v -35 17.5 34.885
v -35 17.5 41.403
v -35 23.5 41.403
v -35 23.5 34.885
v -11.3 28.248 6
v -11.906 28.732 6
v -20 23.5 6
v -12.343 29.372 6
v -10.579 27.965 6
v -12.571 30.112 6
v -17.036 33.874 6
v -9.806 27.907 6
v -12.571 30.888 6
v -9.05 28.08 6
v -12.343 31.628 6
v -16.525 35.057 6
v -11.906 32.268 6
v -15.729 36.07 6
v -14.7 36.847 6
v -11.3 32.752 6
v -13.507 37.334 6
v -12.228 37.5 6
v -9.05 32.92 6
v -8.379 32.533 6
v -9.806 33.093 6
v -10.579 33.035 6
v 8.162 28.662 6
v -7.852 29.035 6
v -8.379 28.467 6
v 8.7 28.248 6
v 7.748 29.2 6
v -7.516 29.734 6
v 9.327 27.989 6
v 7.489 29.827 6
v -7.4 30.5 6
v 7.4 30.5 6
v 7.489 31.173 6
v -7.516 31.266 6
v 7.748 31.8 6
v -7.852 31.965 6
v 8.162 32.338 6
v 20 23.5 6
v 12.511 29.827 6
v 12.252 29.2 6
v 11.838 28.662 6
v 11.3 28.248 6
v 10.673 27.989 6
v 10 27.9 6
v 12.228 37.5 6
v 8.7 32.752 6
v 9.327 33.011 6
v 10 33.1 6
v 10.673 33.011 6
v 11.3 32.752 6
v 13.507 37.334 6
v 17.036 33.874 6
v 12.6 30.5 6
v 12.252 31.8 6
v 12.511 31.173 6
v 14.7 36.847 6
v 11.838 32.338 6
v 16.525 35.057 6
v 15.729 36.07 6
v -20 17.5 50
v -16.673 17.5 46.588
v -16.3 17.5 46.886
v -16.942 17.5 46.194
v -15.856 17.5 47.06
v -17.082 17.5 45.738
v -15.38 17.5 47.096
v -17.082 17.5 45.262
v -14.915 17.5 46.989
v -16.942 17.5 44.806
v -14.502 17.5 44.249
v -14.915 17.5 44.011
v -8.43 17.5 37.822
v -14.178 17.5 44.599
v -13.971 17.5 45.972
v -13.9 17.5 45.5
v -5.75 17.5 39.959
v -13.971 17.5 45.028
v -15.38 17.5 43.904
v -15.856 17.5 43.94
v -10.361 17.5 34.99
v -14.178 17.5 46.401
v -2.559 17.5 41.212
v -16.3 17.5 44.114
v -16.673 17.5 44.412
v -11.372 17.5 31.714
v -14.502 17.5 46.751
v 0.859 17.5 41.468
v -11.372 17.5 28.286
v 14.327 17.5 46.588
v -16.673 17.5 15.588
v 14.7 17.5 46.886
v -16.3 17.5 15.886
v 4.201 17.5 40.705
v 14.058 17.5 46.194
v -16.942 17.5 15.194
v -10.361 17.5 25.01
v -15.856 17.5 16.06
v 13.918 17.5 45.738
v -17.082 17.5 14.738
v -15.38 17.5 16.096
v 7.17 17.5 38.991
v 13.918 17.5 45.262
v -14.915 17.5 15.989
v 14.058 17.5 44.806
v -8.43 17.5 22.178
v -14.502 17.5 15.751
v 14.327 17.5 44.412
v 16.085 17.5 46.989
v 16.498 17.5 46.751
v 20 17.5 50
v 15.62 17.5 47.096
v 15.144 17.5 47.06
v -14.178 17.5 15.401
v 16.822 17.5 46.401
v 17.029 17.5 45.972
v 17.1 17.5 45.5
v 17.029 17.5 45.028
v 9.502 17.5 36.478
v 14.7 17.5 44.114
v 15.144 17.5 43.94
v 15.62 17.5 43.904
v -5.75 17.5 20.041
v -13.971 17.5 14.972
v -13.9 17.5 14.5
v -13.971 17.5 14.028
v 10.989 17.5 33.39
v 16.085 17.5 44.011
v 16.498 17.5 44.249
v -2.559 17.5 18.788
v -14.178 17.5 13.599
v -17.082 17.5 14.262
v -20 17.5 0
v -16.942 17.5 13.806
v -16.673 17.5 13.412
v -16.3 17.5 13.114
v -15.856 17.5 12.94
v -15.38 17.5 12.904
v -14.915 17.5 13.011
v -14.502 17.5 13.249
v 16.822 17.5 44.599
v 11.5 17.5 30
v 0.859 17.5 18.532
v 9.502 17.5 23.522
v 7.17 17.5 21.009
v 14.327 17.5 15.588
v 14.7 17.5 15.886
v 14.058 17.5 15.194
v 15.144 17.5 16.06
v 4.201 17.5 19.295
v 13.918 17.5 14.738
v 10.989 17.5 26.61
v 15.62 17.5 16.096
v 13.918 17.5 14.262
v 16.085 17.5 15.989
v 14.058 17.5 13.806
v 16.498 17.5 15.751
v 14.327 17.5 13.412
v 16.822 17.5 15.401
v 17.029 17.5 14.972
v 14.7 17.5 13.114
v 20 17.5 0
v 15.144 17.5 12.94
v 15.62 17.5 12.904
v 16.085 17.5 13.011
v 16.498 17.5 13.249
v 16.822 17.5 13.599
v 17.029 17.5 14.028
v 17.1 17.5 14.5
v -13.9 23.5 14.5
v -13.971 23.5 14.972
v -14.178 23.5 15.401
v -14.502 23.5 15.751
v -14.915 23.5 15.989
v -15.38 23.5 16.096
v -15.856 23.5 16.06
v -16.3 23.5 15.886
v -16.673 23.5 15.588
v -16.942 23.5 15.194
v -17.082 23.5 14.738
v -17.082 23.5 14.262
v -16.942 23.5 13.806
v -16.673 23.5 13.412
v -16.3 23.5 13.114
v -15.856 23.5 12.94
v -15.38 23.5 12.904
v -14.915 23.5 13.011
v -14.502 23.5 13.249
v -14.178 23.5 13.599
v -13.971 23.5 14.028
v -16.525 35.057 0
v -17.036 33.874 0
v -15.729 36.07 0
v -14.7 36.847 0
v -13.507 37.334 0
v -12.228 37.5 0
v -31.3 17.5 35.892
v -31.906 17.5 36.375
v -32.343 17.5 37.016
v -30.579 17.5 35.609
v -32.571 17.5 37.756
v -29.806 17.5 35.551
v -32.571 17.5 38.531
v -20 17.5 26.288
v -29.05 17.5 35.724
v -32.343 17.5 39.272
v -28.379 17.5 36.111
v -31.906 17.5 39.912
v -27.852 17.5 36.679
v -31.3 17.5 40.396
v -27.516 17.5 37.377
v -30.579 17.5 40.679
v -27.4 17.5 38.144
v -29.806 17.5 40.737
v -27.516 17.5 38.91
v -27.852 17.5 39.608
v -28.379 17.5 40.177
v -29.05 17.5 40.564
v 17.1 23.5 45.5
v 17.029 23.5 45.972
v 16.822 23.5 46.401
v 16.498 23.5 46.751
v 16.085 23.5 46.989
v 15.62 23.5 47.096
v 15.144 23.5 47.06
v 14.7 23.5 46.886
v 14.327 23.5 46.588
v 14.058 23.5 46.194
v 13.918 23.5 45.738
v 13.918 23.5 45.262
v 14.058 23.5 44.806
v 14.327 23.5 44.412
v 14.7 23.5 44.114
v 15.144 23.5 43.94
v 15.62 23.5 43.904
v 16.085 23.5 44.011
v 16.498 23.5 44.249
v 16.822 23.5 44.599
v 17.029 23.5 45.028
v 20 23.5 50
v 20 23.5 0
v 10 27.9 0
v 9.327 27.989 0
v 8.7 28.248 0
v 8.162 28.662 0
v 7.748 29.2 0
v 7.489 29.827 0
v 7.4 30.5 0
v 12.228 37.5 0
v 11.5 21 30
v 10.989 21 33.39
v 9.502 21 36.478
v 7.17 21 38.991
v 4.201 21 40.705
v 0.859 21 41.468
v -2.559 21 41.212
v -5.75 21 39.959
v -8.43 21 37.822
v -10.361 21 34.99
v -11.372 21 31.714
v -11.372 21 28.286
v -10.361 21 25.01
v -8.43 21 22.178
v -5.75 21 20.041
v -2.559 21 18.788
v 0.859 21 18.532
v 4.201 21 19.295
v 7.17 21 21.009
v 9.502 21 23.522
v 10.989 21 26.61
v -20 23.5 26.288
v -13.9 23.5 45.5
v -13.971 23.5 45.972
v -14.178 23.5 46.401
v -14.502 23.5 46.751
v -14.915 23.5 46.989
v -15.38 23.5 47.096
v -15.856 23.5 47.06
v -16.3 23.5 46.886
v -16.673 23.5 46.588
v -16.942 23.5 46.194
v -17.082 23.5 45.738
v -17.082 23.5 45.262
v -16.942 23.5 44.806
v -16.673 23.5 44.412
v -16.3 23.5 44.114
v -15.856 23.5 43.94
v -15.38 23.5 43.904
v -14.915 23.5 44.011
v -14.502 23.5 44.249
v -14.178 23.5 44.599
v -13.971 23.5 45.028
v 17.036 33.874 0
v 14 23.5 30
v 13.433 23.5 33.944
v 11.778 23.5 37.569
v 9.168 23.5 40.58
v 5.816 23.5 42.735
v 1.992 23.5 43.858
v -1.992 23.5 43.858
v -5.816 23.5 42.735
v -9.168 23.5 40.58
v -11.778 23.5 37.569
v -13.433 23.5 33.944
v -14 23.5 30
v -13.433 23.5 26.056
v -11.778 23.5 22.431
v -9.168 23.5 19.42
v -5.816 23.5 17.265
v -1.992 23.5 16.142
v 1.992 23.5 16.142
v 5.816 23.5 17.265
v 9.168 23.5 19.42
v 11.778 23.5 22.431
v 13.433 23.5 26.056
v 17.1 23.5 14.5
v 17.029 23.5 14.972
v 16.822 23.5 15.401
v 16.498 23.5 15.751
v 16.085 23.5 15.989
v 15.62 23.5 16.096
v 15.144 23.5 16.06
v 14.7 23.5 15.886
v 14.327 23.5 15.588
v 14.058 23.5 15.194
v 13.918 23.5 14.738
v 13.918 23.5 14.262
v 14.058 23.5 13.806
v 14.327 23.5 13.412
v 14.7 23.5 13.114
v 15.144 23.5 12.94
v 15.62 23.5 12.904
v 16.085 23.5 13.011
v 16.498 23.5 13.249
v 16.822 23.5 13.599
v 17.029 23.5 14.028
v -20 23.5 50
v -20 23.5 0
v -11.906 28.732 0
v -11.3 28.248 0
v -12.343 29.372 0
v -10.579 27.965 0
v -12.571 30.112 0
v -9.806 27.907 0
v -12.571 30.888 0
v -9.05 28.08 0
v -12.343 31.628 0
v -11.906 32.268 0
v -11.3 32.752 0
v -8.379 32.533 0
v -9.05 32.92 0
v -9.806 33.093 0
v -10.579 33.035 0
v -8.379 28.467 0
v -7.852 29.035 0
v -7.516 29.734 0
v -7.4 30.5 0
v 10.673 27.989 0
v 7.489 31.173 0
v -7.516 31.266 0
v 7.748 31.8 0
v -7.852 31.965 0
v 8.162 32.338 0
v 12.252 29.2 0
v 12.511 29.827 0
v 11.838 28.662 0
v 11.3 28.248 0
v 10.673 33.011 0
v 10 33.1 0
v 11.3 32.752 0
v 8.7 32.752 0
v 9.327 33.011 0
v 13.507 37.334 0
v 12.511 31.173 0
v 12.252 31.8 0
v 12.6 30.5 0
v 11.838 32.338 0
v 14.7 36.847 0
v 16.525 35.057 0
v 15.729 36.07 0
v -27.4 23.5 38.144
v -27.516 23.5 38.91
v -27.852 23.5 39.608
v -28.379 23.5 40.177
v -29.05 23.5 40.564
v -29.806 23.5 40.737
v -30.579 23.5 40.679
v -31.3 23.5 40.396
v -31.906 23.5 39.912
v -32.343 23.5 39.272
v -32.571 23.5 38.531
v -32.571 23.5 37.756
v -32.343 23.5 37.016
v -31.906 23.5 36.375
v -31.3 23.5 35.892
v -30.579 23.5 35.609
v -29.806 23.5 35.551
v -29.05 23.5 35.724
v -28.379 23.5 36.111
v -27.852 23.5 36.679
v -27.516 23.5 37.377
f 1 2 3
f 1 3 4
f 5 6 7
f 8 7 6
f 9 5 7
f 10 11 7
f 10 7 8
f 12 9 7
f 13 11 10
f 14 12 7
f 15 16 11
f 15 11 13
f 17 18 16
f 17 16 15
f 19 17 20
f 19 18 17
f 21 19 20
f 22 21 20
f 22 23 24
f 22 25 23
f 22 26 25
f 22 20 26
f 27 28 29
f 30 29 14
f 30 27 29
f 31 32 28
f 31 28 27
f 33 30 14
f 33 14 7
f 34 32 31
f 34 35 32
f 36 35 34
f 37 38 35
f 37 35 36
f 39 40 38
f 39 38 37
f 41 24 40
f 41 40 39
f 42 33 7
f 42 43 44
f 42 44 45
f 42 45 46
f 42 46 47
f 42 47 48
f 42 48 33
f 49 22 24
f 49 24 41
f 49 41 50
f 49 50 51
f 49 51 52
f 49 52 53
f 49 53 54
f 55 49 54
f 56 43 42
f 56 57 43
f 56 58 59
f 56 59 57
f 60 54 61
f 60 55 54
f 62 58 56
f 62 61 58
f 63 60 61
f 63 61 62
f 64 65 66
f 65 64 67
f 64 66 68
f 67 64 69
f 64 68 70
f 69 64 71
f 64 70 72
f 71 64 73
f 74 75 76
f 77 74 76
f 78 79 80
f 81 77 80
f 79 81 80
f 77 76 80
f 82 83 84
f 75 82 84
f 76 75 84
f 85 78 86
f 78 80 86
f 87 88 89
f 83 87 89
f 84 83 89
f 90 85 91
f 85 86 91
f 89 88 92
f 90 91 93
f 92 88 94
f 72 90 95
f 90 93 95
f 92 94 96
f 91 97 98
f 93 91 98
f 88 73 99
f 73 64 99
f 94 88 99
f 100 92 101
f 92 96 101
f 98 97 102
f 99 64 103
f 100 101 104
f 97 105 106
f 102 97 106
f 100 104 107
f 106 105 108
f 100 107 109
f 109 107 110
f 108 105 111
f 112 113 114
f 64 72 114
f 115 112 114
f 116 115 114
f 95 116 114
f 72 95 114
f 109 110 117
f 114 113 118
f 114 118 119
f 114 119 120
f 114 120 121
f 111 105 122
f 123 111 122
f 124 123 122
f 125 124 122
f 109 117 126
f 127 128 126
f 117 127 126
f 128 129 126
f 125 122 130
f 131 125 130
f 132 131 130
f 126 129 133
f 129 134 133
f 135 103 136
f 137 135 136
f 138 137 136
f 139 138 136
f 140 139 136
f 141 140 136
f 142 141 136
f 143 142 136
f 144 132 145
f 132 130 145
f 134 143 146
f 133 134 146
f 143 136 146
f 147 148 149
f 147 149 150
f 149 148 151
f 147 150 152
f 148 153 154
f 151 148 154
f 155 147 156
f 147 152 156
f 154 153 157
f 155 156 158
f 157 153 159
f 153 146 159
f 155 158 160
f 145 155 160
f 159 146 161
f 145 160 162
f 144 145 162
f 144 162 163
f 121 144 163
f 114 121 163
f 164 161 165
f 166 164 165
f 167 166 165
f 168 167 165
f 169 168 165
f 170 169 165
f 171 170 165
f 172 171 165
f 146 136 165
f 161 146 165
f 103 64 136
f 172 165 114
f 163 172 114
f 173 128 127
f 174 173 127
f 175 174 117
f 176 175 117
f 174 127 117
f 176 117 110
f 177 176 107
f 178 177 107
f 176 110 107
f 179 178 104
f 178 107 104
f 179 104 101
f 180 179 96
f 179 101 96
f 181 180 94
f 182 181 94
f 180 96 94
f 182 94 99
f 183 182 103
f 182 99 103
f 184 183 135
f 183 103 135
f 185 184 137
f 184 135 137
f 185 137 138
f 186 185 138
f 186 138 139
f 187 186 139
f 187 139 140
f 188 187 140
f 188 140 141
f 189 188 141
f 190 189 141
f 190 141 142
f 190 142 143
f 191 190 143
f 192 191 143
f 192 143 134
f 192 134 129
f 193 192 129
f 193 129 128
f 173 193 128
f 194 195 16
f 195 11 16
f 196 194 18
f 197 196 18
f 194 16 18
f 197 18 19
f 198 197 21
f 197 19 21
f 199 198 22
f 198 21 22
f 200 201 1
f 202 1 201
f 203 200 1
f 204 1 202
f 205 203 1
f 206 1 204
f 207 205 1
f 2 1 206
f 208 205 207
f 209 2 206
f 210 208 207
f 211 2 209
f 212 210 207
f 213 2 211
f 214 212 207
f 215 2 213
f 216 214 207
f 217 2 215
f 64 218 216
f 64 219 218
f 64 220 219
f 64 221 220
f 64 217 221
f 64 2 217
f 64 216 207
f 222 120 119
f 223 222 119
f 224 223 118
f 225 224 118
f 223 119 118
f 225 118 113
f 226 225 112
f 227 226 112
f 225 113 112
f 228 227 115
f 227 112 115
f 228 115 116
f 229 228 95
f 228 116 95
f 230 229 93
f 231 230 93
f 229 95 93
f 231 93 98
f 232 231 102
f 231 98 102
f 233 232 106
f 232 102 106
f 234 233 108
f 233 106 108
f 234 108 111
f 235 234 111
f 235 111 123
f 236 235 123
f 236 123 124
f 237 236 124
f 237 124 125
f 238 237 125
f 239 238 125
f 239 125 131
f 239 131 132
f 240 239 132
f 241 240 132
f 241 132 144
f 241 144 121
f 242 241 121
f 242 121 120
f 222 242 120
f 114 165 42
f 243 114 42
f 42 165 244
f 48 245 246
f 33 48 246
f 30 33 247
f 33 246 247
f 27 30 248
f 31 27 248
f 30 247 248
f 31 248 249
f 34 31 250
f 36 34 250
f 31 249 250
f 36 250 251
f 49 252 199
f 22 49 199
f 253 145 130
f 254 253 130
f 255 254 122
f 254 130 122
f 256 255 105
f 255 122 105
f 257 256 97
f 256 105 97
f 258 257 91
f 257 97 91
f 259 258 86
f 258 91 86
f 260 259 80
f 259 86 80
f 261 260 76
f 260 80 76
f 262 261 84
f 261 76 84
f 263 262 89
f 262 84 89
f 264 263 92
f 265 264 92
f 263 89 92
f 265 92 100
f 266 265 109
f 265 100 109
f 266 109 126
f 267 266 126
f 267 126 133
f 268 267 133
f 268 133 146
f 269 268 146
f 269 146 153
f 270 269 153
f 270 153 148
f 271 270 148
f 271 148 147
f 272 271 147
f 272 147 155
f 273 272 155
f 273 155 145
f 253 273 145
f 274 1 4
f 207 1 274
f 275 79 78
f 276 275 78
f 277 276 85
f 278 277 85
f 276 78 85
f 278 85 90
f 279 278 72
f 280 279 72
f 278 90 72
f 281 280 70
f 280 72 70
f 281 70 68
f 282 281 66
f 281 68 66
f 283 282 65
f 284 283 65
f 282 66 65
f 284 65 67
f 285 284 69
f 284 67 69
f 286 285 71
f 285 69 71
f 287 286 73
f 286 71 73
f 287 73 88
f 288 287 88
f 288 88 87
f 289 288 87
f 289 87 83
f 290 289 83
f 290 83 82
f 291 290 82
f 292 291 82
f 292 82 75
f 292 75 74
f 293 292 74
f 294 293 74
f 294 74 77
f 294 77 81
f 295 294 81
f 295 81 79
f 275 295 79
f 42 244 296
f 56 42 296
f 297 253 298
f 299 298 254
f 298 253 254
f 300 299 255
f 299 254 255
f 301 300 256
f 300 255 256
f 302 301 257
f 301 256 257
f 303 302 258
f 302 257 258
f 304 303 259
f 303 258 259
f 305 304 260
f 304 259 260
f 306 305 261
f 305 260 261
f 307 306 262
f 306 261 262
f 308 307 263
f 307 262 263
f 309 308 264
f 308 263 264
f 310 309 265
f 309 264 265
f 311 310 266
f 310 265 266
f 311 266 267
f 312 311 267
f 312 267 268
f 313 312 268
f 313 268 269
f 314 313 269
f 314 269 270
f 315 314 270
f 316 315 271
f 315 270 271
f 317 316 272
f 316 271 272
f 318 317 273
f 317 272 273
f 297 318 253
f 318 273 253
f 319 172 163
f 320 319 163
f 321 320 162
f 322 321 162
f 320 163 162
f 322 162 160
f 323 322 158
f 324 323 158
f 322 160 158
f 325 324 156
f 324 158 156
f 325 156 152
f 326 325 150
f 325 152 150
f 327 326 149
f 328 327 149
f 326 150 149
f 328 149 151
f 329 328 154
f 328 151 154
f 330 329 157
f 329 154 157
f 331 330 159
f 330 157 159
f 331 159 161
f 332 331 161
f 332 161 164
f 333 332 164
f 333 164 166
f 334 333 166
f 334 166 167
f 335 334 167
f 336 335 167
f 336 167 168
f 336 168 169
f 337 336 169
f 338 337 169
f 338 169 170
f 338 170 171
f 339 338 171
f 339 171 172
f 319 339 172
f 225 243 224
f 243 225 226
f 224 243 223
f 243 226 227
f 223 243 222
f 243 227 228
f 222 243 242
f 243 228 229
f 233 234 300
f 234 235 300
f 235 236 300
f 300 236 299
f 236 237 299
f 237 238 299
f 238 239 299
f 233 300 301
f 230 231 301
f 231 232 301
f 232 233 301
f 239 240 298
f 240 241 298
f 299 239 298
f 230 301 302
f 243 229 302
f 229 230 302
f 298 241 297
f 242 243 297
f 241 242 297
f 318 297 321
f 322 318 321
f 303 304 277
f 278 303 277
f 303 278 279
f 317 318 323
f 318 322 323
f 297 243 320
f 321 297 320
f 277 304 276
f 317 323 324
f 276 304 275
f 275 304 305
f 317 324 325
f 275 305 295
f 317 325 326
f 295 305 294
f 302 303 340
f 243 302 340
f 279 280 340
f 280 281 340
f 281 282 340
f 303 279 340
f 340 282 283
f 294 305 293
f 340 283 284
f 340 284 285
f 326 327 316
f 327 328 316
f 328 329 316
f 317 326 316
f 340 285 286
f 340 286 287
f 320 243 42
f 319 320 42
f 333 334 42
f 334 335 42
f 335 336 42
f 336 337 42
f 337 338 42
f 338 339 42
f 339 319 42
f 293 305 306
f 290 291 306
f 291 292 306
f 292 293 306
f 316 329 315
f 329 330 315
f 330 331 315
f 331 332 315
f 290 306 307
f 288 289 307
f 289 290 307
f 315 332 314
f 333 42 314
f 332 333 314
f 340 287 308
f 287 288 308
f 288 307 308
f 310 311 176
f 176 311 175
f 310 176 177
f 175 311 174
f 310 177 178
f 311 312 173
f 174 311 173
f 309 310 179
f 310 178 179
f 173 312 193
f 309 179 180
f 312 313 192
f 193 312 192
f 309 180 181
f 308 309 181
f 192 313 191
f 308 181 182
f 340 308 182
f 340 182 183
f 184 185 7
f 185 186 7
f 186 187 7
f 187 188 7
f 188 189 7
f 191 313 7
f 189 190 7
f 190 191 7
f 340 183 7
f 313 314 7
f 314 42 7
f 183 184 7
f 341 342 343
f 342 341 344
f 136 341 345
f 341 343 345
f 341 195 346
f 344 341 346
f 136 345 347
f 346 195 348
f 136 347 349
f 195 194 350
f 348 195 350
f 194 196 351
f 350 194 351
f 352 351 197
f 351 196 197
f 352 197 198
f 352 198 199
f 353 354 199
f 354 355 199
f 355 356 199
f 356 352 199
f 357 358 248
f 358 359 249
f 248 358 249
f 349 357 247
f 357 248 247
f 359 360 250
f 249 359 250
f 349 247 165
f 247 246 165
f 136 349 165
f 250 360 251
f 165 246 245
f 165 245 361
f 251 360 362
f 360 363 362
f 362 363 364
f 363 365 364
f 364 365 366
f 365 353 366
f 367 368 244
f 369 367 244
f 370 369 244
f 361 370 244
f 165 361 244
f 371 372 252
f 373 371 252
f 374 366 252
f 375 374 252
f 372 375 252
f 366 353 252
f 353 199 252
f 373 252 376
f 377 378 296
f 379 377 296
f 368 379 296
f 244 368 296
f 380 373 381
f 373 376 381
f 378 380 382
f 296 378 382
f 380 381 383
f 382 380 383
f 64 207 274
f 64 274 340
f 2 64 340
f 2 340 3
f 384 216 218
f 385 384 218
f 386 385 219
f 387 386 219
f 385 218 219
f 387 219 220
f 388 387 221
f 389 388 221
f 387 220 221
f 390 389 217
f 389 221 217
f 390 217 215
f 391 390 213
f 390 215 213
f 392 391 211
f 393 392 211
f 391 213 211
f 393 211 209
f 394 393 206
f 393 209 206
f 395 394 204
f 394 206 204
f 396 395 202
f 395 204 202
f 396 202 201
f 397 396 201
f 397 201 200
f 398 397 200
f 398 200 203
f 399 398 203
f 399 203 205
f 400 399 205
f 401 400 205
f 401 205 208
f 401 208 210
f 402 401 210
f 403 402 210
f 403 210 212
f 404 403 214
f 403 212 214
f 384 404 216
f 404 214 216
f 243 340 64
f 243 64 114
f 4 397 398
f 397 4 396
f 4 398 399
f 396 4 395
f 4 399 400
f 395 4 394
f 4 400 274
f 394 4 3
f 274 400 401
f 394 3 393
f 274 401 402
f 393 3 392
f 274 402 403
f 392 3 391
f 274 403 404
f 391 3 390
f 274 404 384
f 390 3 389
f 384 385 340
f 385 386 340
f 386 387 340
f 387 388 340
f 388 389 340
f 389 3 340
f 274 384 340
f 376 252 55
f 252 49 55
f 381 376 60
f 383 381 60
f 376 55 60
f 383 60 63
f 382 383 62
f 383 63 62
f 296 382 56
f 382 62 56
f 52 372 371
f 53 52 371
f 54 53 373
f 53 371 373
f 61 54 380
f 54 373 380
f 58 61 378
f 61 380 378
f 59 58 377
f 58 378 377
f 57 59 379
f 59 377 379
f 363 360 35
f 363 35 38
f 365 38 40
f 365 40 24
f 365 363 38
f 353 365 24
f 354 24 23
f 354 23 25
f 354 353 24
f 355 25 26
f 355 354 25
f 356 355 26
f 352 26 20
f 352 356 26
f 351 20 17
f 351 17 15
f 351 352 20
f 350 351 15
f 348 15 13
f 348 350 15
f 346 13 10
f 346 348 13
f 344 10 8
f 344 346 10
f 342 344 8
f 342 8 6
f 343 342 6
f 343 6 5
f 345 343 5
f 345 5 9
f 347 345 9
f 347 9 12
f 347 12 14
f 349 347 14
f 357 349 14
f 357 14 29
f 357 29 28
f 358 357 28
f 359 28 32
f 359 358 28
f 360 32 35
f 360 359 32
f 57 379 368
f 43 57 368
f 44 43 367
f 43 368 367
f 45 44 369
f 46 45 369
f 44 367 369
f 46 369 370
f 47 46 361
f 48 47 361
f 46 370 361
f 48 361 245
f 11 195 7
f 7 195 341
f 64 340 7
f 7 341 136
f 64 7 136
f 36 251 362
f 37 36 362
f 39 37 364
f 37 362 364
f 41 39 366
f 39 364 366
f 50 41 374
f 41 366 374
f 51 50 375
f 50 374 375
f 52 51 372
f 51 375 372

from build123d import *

# Parameters (mm, degrees)
F1_W     = 12
F1_H     = 14
F1_R     = 2.6
F2_DEPTH = 6
F3_DEPTH = 50
F4_R     = 11.5
F4_R_2   = 1.6
F5_DEPTH = 20.001
F6_R     = 2.6
F7_DEPTH = 6
F8_R     = 5
F9_SIZE  = 2.5


# Not quite as in the source:
# - a feature names something its author has since deleted; it is built from what else it names


with BuildPart() as f2:
    # F1 (on Top) → F2 (new body)
    with BuildSketch(Plane.XY):
        with Locations((-10, 30.4999971617)):
            Rectangle(F1_W, F1_H)
        with Locations((-10, 30.4999971617)):
            Circle(F1_R, mode=Mode.SUBTRACT)
        with BuildLine():
            Line((10, 33.0999971617), (10, 37.4999971617))
            Line((10, 37.4999971617), (4, 37.4999971617))
            Line((4, 37.4999971617), (4, 30.4999971617))
            Line((4, 30.4999971617), (7.4, 30.4999971617))
            ThreePointArc((7.4, 30.4999971617), (8.1615223689, 32.3384747928), (10, 33.0999971617))
        make_face()
        with BuildLine():
            Line((16, 30.4999971617), (16, 37.4999971617))
            Line((16, 37.4999971617), (10, 37.4999971617))
            Line((10, 37.4999971617), (10, 33.0999971617))
            ThreePointArc((10, 33.0999971617), (11.8384776311, 32.3384747928), (12.6, 30.4999971617))
            Line((12.6, 30.4999971617), (16, 30.4999971617))
        make_face()
        with BuildLine():
            Line((10, 23.4999971617), (16, 23.4999971617))
            Line((16, 23.4999971617), (16, 30.4999971617))
            Line((16, 30.4999971617), (12.6, 30.4999971617))
            ThreePointArc((12.6, 30.4999971617), (11.8384776311, 28.6615195306), (10, 27.8999971617))
            Line((10, 27.8999971617), (10, 23.4999971617))
        make_face()
        with BuildLine():
            Line((4, 23.4999971617), (10, 23.4999971617))
            Line((10, 23.4999971617), (10, 27.8999971617))
            ThreePointArc((10, 27.8999971617), (8.1615223689, 28.6615195306), (7.4, 30.4999971617))
            Line((7.4, 30.4999971617), (4, 30.4999971617))
            Line((4, 30.4999971617), (4, 23.4999971617))
        make_face()
        Polygon((-16, 37.4999971617), (-20, 23.4999971617), (-16, 23.4999971617), align=None)
        Polygon((-4, 37.4999971617), (-4, 23.4999971617), (4, 23.4999971617), (4, 30.4999971617), (4, 37.4999971617), align=None)
        Polygon((16, 23.4999971617), (20, 23.4999971617), (16, 37.4999971617), (16, 30.4999971617), align=None)
    extrude(amount=F2_DEPTH)

    # F1 (on Top) → F3 (join)
    with BuildSketch(Plane.XY):
        Polygon((-20, 23.4999971617), (-20, 17.4999971617), (20, 17.4999971617), (20, 23.4999971617), (16, 23.4999971617), (10, 23.4999971617), (4, 23.4999971617), (-4, 23.4999971617), (-16, 23.4999971617), align=None)
    extrude(amount=F3_DEPTH)

    # F4 (on face) → F5 (cut, through all)
    with BuildSketch(Plane.XZ.offset(-17.4999971617)):
        with Locations((0, 30)):
            Circle(F4_R)
        with Locations((-15.5, 45.5)):
            Circle(F4_R_2)
        with Locations((-15.5, 14.5)):
            Circle(F4_R_2)
        with Locations((15.5, 14.5)):
            Circle(F4_R_2)
        with Locations((15.5, 45.5)):
            Circle(F4_R_2)
    extrude(amount=-F5_DEPTH, mode=Mode.SUBTRACT)

    # F8
    f8_edges = [f2.edges().sort_by_distance(p)[0] for p in [
        (16, 37.499997, 3),
        (-16, 37.499997, 3),
    ]]
    fillet(f8_edges, radius=F8_R)

    # F9
    f9_edges = [f2.edges().sort_by_distance(p)[0] for p in [
        (-11.5, 23.499997, 30),
    ]]
    chamfer(f9_edges, length=F9_SIZE)


with BuildPart() as f7:
    # F6 (on face) → F7 (new body)
    with BuildSketch(Plane.XZ.offset(-17.4999971617)):
        Polygon((-20, 38.1438449025), (-20, 41.4031773806), (-35, 41.4031773806), (-35, 34.8845124245), (-20, 34.8845124245), align=None)
        with Locations((-30, 38.1438449025)):
            Circle(F6_R, mode=Mode.SUBTRACT)
        Polygon((-35, 41.4031773806), (-20, 41.4031773806), (-20, 50), align=None)
        Polygon((-20, 34.8845124245), (-35, 34.8845124245), (-20, 26.287689805), align=None)
    extrude(amount=-F7_DEPTH)


solid = Compound([f2.part, f7.part])
